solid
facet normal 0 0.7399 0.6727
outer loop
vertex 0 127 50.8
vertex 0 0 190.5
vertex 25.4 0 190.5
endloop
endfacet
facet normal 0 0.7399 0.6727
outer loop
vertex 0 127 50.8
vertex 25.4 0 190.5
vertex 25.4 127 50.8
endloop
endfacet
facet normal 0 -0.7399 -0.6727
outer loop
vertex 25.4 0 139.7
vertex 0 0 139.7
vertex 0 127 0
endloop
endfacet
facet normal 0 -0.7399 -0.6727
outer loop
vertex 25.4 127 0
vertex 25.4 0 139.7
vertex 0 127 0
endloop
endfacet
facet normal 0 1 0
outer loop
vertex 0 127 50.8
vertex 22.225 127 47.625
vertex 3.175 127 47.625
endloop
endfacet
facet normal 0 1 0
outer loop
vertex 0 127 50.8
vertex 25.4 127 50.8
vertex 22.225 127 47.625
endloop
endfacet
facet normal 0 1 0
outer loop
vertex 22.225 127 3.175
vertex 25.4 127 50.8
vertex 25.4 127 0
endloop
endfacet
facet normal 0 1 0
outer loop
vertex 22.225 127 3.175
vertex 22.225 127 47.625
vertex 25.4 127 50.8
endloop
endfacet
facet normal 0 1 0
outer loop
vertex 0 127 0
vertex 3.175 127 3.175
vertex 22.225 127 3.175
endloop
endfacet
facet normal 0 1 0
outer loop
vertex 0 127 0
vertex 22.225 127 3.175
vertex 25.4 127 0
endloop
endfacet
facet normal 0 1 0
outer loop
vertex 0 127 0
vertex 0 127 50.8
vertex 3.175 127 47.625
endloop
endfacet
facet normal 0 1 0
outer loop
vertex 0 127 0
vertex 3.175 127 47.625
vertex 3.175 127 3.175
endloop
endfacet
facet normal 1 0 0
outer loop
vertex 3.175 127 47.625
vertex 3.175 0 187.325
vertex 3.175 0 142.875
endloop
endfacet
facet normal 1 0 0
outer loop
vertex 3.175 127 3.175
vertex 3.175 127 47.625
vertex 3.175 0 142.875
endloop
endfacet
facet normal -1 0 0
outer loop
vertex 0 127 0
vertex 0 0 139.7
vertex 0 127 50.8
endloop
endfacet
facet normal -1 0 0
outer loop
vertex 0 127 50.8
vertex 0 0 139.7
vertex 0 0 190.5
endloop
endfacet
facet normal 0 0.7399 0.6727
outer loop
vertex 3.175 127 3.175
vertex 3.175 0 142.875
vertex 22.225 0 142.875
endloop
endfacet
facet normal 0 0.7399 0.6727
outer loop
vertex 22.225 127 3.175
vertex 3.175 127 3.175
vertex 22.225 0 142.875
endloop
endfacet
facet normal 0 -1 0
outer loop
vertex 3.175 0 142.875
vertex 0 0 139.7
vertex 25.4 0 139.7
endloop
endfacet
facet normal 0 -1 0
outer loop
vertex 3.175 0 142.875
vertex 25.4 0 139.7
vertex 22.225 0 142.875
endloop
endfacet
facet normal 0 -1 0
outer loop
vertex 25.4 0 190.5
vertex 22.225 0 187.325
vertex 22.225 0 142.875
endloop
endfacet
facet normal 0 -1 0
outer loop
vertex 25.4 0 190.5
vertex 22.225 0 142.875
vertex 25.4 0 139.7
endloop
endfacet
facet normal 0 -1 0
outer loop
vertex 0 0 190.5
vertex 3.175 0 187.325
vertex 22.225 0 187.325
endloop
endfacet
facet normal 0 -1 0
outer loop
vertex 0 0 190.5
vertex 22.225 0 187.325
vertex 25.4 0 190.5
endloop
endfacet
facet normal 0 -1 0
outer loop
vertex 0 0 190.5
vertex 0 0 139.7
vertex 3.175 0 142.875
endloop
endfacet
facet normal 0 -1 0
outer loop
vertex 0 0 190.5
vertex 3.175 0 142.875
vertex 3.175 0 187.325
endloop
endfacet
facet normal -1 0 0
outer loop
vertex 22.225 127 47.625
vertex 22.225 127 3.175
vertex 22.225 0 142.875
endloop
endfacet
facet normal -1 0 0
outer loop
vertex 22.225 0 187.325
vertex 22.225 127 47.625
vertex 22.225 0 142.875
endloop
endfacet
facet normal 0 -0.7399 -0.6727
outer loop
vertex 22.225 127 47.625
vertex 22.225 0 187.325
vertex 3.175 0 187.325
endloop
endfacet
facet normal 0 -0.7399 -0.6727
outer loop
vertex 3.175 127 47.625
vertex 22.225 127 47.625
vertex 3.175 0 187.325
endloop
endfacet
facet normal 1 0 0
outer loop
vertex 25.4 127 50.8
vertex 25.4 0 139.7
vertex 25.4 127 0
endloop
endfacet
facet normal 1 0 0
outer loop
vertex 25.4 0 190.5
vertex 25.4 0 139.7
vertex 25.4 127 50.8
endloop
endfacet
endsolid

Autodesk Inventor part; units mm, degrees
ref_plane "YZ Plane" through (0, 0, 0) normal (1, 0, 0) x (0, 1, 0)
ref_plane "XZ Plane" through (0, 0, 0) normal (0, 1, 0) x (-1, 0, 0)
ref_plane "XY Plane" through (0, 0, 0) normal (0, 0, 1) x (1, 0, 0)
sketch "Sketch3" plane through (0, 0, 0) normal (1, 0, 0) x (0, 1, 0)
  line L0 (0, 190.5) -> (127, 50.8)
  line L1 (0, 139.7) -> (127, 0)
  line L2 (127, 50.8) -> (127, 0)
  line L3 (0, 139.7) -> (0, 190.5)
  point P0 (0, 0)
  dimension "d10" = 34.1718
  dimension "d11" = 42.274
  dimension "d12" = 127
extrude "Extrusion1" add sketch "Sketch3" along normal blind 25.4
sketch "Sketch4" plane through (0, 127, 50.8) normal (0, 1, 0) x (1, 0, 0)
  line L0 (0, -139.7) -> (0, 0) projected
  line L1 (25.4, 0) -> (25.4, -139.7) projected
  line L2 (0, 50.8) -> (25.4, 50.8) projected
  line L3 (0, -139.7) -> (25.4, -139.7) projected
  line L4 (22.225, 3.175) -> (3.175, 3.175)
  line L5 (3.175, 3.175) -> (3.175, 47.625)
  line L6 (3.175, 47.625) -> (22.225, 47.625)
  line L7 (22.225, 47.625) -> (22.225, 3.175)
  line L8 (0, 0) -> (0, 50.8) projected
  line L9 (0, 0) -> (25.4, 0) projected
  dimension "d19" = 3.175
  dimension "d20" = 3.175
  dimension "d21" = 3.175
  dimension "d22" = 19.05
sketch "Sketch6" plane through (0, 0, 139.7) normal (0, -1, 0) x (1, 0, 0)
  line L0 (22.225, 47.625) -> (3.175, 47.625)
  line L1 (3.175, 47.625) -> (3.175, 3.175)
  line L2 (3.175, 3.175) -> (22.225, 3.175)
  line L3 (22.225, 3.175) -> (22.225, 47.625)
  line L4 (25.4, 50.8) -> (25.4, 0) projected
  line L5 (0, 0) -> (25.4, 0) projected
  line L6 (0, 50.8) -> (25.4, 50.8) projected
  point P0 (0, -139.7)
  dimension "d27" = 19.05
  dimension "d28" = 3.175
  dimension "d29" = 3.175
  dimension "d30" = 3.175
sketch3d "3D Sketch1"
  line L0 (25.4, 0, 190.5) -> (25.4, 127, 50.8)
sweep "Sweep1" cut profiles "Sketch6" path "3D Sketch1"
equation "\"d28\" = d19"
equation "\"d29\" = d20"
equation "\"d30\" = d20"
properties part number "Diagonal Roller Cage Support"
